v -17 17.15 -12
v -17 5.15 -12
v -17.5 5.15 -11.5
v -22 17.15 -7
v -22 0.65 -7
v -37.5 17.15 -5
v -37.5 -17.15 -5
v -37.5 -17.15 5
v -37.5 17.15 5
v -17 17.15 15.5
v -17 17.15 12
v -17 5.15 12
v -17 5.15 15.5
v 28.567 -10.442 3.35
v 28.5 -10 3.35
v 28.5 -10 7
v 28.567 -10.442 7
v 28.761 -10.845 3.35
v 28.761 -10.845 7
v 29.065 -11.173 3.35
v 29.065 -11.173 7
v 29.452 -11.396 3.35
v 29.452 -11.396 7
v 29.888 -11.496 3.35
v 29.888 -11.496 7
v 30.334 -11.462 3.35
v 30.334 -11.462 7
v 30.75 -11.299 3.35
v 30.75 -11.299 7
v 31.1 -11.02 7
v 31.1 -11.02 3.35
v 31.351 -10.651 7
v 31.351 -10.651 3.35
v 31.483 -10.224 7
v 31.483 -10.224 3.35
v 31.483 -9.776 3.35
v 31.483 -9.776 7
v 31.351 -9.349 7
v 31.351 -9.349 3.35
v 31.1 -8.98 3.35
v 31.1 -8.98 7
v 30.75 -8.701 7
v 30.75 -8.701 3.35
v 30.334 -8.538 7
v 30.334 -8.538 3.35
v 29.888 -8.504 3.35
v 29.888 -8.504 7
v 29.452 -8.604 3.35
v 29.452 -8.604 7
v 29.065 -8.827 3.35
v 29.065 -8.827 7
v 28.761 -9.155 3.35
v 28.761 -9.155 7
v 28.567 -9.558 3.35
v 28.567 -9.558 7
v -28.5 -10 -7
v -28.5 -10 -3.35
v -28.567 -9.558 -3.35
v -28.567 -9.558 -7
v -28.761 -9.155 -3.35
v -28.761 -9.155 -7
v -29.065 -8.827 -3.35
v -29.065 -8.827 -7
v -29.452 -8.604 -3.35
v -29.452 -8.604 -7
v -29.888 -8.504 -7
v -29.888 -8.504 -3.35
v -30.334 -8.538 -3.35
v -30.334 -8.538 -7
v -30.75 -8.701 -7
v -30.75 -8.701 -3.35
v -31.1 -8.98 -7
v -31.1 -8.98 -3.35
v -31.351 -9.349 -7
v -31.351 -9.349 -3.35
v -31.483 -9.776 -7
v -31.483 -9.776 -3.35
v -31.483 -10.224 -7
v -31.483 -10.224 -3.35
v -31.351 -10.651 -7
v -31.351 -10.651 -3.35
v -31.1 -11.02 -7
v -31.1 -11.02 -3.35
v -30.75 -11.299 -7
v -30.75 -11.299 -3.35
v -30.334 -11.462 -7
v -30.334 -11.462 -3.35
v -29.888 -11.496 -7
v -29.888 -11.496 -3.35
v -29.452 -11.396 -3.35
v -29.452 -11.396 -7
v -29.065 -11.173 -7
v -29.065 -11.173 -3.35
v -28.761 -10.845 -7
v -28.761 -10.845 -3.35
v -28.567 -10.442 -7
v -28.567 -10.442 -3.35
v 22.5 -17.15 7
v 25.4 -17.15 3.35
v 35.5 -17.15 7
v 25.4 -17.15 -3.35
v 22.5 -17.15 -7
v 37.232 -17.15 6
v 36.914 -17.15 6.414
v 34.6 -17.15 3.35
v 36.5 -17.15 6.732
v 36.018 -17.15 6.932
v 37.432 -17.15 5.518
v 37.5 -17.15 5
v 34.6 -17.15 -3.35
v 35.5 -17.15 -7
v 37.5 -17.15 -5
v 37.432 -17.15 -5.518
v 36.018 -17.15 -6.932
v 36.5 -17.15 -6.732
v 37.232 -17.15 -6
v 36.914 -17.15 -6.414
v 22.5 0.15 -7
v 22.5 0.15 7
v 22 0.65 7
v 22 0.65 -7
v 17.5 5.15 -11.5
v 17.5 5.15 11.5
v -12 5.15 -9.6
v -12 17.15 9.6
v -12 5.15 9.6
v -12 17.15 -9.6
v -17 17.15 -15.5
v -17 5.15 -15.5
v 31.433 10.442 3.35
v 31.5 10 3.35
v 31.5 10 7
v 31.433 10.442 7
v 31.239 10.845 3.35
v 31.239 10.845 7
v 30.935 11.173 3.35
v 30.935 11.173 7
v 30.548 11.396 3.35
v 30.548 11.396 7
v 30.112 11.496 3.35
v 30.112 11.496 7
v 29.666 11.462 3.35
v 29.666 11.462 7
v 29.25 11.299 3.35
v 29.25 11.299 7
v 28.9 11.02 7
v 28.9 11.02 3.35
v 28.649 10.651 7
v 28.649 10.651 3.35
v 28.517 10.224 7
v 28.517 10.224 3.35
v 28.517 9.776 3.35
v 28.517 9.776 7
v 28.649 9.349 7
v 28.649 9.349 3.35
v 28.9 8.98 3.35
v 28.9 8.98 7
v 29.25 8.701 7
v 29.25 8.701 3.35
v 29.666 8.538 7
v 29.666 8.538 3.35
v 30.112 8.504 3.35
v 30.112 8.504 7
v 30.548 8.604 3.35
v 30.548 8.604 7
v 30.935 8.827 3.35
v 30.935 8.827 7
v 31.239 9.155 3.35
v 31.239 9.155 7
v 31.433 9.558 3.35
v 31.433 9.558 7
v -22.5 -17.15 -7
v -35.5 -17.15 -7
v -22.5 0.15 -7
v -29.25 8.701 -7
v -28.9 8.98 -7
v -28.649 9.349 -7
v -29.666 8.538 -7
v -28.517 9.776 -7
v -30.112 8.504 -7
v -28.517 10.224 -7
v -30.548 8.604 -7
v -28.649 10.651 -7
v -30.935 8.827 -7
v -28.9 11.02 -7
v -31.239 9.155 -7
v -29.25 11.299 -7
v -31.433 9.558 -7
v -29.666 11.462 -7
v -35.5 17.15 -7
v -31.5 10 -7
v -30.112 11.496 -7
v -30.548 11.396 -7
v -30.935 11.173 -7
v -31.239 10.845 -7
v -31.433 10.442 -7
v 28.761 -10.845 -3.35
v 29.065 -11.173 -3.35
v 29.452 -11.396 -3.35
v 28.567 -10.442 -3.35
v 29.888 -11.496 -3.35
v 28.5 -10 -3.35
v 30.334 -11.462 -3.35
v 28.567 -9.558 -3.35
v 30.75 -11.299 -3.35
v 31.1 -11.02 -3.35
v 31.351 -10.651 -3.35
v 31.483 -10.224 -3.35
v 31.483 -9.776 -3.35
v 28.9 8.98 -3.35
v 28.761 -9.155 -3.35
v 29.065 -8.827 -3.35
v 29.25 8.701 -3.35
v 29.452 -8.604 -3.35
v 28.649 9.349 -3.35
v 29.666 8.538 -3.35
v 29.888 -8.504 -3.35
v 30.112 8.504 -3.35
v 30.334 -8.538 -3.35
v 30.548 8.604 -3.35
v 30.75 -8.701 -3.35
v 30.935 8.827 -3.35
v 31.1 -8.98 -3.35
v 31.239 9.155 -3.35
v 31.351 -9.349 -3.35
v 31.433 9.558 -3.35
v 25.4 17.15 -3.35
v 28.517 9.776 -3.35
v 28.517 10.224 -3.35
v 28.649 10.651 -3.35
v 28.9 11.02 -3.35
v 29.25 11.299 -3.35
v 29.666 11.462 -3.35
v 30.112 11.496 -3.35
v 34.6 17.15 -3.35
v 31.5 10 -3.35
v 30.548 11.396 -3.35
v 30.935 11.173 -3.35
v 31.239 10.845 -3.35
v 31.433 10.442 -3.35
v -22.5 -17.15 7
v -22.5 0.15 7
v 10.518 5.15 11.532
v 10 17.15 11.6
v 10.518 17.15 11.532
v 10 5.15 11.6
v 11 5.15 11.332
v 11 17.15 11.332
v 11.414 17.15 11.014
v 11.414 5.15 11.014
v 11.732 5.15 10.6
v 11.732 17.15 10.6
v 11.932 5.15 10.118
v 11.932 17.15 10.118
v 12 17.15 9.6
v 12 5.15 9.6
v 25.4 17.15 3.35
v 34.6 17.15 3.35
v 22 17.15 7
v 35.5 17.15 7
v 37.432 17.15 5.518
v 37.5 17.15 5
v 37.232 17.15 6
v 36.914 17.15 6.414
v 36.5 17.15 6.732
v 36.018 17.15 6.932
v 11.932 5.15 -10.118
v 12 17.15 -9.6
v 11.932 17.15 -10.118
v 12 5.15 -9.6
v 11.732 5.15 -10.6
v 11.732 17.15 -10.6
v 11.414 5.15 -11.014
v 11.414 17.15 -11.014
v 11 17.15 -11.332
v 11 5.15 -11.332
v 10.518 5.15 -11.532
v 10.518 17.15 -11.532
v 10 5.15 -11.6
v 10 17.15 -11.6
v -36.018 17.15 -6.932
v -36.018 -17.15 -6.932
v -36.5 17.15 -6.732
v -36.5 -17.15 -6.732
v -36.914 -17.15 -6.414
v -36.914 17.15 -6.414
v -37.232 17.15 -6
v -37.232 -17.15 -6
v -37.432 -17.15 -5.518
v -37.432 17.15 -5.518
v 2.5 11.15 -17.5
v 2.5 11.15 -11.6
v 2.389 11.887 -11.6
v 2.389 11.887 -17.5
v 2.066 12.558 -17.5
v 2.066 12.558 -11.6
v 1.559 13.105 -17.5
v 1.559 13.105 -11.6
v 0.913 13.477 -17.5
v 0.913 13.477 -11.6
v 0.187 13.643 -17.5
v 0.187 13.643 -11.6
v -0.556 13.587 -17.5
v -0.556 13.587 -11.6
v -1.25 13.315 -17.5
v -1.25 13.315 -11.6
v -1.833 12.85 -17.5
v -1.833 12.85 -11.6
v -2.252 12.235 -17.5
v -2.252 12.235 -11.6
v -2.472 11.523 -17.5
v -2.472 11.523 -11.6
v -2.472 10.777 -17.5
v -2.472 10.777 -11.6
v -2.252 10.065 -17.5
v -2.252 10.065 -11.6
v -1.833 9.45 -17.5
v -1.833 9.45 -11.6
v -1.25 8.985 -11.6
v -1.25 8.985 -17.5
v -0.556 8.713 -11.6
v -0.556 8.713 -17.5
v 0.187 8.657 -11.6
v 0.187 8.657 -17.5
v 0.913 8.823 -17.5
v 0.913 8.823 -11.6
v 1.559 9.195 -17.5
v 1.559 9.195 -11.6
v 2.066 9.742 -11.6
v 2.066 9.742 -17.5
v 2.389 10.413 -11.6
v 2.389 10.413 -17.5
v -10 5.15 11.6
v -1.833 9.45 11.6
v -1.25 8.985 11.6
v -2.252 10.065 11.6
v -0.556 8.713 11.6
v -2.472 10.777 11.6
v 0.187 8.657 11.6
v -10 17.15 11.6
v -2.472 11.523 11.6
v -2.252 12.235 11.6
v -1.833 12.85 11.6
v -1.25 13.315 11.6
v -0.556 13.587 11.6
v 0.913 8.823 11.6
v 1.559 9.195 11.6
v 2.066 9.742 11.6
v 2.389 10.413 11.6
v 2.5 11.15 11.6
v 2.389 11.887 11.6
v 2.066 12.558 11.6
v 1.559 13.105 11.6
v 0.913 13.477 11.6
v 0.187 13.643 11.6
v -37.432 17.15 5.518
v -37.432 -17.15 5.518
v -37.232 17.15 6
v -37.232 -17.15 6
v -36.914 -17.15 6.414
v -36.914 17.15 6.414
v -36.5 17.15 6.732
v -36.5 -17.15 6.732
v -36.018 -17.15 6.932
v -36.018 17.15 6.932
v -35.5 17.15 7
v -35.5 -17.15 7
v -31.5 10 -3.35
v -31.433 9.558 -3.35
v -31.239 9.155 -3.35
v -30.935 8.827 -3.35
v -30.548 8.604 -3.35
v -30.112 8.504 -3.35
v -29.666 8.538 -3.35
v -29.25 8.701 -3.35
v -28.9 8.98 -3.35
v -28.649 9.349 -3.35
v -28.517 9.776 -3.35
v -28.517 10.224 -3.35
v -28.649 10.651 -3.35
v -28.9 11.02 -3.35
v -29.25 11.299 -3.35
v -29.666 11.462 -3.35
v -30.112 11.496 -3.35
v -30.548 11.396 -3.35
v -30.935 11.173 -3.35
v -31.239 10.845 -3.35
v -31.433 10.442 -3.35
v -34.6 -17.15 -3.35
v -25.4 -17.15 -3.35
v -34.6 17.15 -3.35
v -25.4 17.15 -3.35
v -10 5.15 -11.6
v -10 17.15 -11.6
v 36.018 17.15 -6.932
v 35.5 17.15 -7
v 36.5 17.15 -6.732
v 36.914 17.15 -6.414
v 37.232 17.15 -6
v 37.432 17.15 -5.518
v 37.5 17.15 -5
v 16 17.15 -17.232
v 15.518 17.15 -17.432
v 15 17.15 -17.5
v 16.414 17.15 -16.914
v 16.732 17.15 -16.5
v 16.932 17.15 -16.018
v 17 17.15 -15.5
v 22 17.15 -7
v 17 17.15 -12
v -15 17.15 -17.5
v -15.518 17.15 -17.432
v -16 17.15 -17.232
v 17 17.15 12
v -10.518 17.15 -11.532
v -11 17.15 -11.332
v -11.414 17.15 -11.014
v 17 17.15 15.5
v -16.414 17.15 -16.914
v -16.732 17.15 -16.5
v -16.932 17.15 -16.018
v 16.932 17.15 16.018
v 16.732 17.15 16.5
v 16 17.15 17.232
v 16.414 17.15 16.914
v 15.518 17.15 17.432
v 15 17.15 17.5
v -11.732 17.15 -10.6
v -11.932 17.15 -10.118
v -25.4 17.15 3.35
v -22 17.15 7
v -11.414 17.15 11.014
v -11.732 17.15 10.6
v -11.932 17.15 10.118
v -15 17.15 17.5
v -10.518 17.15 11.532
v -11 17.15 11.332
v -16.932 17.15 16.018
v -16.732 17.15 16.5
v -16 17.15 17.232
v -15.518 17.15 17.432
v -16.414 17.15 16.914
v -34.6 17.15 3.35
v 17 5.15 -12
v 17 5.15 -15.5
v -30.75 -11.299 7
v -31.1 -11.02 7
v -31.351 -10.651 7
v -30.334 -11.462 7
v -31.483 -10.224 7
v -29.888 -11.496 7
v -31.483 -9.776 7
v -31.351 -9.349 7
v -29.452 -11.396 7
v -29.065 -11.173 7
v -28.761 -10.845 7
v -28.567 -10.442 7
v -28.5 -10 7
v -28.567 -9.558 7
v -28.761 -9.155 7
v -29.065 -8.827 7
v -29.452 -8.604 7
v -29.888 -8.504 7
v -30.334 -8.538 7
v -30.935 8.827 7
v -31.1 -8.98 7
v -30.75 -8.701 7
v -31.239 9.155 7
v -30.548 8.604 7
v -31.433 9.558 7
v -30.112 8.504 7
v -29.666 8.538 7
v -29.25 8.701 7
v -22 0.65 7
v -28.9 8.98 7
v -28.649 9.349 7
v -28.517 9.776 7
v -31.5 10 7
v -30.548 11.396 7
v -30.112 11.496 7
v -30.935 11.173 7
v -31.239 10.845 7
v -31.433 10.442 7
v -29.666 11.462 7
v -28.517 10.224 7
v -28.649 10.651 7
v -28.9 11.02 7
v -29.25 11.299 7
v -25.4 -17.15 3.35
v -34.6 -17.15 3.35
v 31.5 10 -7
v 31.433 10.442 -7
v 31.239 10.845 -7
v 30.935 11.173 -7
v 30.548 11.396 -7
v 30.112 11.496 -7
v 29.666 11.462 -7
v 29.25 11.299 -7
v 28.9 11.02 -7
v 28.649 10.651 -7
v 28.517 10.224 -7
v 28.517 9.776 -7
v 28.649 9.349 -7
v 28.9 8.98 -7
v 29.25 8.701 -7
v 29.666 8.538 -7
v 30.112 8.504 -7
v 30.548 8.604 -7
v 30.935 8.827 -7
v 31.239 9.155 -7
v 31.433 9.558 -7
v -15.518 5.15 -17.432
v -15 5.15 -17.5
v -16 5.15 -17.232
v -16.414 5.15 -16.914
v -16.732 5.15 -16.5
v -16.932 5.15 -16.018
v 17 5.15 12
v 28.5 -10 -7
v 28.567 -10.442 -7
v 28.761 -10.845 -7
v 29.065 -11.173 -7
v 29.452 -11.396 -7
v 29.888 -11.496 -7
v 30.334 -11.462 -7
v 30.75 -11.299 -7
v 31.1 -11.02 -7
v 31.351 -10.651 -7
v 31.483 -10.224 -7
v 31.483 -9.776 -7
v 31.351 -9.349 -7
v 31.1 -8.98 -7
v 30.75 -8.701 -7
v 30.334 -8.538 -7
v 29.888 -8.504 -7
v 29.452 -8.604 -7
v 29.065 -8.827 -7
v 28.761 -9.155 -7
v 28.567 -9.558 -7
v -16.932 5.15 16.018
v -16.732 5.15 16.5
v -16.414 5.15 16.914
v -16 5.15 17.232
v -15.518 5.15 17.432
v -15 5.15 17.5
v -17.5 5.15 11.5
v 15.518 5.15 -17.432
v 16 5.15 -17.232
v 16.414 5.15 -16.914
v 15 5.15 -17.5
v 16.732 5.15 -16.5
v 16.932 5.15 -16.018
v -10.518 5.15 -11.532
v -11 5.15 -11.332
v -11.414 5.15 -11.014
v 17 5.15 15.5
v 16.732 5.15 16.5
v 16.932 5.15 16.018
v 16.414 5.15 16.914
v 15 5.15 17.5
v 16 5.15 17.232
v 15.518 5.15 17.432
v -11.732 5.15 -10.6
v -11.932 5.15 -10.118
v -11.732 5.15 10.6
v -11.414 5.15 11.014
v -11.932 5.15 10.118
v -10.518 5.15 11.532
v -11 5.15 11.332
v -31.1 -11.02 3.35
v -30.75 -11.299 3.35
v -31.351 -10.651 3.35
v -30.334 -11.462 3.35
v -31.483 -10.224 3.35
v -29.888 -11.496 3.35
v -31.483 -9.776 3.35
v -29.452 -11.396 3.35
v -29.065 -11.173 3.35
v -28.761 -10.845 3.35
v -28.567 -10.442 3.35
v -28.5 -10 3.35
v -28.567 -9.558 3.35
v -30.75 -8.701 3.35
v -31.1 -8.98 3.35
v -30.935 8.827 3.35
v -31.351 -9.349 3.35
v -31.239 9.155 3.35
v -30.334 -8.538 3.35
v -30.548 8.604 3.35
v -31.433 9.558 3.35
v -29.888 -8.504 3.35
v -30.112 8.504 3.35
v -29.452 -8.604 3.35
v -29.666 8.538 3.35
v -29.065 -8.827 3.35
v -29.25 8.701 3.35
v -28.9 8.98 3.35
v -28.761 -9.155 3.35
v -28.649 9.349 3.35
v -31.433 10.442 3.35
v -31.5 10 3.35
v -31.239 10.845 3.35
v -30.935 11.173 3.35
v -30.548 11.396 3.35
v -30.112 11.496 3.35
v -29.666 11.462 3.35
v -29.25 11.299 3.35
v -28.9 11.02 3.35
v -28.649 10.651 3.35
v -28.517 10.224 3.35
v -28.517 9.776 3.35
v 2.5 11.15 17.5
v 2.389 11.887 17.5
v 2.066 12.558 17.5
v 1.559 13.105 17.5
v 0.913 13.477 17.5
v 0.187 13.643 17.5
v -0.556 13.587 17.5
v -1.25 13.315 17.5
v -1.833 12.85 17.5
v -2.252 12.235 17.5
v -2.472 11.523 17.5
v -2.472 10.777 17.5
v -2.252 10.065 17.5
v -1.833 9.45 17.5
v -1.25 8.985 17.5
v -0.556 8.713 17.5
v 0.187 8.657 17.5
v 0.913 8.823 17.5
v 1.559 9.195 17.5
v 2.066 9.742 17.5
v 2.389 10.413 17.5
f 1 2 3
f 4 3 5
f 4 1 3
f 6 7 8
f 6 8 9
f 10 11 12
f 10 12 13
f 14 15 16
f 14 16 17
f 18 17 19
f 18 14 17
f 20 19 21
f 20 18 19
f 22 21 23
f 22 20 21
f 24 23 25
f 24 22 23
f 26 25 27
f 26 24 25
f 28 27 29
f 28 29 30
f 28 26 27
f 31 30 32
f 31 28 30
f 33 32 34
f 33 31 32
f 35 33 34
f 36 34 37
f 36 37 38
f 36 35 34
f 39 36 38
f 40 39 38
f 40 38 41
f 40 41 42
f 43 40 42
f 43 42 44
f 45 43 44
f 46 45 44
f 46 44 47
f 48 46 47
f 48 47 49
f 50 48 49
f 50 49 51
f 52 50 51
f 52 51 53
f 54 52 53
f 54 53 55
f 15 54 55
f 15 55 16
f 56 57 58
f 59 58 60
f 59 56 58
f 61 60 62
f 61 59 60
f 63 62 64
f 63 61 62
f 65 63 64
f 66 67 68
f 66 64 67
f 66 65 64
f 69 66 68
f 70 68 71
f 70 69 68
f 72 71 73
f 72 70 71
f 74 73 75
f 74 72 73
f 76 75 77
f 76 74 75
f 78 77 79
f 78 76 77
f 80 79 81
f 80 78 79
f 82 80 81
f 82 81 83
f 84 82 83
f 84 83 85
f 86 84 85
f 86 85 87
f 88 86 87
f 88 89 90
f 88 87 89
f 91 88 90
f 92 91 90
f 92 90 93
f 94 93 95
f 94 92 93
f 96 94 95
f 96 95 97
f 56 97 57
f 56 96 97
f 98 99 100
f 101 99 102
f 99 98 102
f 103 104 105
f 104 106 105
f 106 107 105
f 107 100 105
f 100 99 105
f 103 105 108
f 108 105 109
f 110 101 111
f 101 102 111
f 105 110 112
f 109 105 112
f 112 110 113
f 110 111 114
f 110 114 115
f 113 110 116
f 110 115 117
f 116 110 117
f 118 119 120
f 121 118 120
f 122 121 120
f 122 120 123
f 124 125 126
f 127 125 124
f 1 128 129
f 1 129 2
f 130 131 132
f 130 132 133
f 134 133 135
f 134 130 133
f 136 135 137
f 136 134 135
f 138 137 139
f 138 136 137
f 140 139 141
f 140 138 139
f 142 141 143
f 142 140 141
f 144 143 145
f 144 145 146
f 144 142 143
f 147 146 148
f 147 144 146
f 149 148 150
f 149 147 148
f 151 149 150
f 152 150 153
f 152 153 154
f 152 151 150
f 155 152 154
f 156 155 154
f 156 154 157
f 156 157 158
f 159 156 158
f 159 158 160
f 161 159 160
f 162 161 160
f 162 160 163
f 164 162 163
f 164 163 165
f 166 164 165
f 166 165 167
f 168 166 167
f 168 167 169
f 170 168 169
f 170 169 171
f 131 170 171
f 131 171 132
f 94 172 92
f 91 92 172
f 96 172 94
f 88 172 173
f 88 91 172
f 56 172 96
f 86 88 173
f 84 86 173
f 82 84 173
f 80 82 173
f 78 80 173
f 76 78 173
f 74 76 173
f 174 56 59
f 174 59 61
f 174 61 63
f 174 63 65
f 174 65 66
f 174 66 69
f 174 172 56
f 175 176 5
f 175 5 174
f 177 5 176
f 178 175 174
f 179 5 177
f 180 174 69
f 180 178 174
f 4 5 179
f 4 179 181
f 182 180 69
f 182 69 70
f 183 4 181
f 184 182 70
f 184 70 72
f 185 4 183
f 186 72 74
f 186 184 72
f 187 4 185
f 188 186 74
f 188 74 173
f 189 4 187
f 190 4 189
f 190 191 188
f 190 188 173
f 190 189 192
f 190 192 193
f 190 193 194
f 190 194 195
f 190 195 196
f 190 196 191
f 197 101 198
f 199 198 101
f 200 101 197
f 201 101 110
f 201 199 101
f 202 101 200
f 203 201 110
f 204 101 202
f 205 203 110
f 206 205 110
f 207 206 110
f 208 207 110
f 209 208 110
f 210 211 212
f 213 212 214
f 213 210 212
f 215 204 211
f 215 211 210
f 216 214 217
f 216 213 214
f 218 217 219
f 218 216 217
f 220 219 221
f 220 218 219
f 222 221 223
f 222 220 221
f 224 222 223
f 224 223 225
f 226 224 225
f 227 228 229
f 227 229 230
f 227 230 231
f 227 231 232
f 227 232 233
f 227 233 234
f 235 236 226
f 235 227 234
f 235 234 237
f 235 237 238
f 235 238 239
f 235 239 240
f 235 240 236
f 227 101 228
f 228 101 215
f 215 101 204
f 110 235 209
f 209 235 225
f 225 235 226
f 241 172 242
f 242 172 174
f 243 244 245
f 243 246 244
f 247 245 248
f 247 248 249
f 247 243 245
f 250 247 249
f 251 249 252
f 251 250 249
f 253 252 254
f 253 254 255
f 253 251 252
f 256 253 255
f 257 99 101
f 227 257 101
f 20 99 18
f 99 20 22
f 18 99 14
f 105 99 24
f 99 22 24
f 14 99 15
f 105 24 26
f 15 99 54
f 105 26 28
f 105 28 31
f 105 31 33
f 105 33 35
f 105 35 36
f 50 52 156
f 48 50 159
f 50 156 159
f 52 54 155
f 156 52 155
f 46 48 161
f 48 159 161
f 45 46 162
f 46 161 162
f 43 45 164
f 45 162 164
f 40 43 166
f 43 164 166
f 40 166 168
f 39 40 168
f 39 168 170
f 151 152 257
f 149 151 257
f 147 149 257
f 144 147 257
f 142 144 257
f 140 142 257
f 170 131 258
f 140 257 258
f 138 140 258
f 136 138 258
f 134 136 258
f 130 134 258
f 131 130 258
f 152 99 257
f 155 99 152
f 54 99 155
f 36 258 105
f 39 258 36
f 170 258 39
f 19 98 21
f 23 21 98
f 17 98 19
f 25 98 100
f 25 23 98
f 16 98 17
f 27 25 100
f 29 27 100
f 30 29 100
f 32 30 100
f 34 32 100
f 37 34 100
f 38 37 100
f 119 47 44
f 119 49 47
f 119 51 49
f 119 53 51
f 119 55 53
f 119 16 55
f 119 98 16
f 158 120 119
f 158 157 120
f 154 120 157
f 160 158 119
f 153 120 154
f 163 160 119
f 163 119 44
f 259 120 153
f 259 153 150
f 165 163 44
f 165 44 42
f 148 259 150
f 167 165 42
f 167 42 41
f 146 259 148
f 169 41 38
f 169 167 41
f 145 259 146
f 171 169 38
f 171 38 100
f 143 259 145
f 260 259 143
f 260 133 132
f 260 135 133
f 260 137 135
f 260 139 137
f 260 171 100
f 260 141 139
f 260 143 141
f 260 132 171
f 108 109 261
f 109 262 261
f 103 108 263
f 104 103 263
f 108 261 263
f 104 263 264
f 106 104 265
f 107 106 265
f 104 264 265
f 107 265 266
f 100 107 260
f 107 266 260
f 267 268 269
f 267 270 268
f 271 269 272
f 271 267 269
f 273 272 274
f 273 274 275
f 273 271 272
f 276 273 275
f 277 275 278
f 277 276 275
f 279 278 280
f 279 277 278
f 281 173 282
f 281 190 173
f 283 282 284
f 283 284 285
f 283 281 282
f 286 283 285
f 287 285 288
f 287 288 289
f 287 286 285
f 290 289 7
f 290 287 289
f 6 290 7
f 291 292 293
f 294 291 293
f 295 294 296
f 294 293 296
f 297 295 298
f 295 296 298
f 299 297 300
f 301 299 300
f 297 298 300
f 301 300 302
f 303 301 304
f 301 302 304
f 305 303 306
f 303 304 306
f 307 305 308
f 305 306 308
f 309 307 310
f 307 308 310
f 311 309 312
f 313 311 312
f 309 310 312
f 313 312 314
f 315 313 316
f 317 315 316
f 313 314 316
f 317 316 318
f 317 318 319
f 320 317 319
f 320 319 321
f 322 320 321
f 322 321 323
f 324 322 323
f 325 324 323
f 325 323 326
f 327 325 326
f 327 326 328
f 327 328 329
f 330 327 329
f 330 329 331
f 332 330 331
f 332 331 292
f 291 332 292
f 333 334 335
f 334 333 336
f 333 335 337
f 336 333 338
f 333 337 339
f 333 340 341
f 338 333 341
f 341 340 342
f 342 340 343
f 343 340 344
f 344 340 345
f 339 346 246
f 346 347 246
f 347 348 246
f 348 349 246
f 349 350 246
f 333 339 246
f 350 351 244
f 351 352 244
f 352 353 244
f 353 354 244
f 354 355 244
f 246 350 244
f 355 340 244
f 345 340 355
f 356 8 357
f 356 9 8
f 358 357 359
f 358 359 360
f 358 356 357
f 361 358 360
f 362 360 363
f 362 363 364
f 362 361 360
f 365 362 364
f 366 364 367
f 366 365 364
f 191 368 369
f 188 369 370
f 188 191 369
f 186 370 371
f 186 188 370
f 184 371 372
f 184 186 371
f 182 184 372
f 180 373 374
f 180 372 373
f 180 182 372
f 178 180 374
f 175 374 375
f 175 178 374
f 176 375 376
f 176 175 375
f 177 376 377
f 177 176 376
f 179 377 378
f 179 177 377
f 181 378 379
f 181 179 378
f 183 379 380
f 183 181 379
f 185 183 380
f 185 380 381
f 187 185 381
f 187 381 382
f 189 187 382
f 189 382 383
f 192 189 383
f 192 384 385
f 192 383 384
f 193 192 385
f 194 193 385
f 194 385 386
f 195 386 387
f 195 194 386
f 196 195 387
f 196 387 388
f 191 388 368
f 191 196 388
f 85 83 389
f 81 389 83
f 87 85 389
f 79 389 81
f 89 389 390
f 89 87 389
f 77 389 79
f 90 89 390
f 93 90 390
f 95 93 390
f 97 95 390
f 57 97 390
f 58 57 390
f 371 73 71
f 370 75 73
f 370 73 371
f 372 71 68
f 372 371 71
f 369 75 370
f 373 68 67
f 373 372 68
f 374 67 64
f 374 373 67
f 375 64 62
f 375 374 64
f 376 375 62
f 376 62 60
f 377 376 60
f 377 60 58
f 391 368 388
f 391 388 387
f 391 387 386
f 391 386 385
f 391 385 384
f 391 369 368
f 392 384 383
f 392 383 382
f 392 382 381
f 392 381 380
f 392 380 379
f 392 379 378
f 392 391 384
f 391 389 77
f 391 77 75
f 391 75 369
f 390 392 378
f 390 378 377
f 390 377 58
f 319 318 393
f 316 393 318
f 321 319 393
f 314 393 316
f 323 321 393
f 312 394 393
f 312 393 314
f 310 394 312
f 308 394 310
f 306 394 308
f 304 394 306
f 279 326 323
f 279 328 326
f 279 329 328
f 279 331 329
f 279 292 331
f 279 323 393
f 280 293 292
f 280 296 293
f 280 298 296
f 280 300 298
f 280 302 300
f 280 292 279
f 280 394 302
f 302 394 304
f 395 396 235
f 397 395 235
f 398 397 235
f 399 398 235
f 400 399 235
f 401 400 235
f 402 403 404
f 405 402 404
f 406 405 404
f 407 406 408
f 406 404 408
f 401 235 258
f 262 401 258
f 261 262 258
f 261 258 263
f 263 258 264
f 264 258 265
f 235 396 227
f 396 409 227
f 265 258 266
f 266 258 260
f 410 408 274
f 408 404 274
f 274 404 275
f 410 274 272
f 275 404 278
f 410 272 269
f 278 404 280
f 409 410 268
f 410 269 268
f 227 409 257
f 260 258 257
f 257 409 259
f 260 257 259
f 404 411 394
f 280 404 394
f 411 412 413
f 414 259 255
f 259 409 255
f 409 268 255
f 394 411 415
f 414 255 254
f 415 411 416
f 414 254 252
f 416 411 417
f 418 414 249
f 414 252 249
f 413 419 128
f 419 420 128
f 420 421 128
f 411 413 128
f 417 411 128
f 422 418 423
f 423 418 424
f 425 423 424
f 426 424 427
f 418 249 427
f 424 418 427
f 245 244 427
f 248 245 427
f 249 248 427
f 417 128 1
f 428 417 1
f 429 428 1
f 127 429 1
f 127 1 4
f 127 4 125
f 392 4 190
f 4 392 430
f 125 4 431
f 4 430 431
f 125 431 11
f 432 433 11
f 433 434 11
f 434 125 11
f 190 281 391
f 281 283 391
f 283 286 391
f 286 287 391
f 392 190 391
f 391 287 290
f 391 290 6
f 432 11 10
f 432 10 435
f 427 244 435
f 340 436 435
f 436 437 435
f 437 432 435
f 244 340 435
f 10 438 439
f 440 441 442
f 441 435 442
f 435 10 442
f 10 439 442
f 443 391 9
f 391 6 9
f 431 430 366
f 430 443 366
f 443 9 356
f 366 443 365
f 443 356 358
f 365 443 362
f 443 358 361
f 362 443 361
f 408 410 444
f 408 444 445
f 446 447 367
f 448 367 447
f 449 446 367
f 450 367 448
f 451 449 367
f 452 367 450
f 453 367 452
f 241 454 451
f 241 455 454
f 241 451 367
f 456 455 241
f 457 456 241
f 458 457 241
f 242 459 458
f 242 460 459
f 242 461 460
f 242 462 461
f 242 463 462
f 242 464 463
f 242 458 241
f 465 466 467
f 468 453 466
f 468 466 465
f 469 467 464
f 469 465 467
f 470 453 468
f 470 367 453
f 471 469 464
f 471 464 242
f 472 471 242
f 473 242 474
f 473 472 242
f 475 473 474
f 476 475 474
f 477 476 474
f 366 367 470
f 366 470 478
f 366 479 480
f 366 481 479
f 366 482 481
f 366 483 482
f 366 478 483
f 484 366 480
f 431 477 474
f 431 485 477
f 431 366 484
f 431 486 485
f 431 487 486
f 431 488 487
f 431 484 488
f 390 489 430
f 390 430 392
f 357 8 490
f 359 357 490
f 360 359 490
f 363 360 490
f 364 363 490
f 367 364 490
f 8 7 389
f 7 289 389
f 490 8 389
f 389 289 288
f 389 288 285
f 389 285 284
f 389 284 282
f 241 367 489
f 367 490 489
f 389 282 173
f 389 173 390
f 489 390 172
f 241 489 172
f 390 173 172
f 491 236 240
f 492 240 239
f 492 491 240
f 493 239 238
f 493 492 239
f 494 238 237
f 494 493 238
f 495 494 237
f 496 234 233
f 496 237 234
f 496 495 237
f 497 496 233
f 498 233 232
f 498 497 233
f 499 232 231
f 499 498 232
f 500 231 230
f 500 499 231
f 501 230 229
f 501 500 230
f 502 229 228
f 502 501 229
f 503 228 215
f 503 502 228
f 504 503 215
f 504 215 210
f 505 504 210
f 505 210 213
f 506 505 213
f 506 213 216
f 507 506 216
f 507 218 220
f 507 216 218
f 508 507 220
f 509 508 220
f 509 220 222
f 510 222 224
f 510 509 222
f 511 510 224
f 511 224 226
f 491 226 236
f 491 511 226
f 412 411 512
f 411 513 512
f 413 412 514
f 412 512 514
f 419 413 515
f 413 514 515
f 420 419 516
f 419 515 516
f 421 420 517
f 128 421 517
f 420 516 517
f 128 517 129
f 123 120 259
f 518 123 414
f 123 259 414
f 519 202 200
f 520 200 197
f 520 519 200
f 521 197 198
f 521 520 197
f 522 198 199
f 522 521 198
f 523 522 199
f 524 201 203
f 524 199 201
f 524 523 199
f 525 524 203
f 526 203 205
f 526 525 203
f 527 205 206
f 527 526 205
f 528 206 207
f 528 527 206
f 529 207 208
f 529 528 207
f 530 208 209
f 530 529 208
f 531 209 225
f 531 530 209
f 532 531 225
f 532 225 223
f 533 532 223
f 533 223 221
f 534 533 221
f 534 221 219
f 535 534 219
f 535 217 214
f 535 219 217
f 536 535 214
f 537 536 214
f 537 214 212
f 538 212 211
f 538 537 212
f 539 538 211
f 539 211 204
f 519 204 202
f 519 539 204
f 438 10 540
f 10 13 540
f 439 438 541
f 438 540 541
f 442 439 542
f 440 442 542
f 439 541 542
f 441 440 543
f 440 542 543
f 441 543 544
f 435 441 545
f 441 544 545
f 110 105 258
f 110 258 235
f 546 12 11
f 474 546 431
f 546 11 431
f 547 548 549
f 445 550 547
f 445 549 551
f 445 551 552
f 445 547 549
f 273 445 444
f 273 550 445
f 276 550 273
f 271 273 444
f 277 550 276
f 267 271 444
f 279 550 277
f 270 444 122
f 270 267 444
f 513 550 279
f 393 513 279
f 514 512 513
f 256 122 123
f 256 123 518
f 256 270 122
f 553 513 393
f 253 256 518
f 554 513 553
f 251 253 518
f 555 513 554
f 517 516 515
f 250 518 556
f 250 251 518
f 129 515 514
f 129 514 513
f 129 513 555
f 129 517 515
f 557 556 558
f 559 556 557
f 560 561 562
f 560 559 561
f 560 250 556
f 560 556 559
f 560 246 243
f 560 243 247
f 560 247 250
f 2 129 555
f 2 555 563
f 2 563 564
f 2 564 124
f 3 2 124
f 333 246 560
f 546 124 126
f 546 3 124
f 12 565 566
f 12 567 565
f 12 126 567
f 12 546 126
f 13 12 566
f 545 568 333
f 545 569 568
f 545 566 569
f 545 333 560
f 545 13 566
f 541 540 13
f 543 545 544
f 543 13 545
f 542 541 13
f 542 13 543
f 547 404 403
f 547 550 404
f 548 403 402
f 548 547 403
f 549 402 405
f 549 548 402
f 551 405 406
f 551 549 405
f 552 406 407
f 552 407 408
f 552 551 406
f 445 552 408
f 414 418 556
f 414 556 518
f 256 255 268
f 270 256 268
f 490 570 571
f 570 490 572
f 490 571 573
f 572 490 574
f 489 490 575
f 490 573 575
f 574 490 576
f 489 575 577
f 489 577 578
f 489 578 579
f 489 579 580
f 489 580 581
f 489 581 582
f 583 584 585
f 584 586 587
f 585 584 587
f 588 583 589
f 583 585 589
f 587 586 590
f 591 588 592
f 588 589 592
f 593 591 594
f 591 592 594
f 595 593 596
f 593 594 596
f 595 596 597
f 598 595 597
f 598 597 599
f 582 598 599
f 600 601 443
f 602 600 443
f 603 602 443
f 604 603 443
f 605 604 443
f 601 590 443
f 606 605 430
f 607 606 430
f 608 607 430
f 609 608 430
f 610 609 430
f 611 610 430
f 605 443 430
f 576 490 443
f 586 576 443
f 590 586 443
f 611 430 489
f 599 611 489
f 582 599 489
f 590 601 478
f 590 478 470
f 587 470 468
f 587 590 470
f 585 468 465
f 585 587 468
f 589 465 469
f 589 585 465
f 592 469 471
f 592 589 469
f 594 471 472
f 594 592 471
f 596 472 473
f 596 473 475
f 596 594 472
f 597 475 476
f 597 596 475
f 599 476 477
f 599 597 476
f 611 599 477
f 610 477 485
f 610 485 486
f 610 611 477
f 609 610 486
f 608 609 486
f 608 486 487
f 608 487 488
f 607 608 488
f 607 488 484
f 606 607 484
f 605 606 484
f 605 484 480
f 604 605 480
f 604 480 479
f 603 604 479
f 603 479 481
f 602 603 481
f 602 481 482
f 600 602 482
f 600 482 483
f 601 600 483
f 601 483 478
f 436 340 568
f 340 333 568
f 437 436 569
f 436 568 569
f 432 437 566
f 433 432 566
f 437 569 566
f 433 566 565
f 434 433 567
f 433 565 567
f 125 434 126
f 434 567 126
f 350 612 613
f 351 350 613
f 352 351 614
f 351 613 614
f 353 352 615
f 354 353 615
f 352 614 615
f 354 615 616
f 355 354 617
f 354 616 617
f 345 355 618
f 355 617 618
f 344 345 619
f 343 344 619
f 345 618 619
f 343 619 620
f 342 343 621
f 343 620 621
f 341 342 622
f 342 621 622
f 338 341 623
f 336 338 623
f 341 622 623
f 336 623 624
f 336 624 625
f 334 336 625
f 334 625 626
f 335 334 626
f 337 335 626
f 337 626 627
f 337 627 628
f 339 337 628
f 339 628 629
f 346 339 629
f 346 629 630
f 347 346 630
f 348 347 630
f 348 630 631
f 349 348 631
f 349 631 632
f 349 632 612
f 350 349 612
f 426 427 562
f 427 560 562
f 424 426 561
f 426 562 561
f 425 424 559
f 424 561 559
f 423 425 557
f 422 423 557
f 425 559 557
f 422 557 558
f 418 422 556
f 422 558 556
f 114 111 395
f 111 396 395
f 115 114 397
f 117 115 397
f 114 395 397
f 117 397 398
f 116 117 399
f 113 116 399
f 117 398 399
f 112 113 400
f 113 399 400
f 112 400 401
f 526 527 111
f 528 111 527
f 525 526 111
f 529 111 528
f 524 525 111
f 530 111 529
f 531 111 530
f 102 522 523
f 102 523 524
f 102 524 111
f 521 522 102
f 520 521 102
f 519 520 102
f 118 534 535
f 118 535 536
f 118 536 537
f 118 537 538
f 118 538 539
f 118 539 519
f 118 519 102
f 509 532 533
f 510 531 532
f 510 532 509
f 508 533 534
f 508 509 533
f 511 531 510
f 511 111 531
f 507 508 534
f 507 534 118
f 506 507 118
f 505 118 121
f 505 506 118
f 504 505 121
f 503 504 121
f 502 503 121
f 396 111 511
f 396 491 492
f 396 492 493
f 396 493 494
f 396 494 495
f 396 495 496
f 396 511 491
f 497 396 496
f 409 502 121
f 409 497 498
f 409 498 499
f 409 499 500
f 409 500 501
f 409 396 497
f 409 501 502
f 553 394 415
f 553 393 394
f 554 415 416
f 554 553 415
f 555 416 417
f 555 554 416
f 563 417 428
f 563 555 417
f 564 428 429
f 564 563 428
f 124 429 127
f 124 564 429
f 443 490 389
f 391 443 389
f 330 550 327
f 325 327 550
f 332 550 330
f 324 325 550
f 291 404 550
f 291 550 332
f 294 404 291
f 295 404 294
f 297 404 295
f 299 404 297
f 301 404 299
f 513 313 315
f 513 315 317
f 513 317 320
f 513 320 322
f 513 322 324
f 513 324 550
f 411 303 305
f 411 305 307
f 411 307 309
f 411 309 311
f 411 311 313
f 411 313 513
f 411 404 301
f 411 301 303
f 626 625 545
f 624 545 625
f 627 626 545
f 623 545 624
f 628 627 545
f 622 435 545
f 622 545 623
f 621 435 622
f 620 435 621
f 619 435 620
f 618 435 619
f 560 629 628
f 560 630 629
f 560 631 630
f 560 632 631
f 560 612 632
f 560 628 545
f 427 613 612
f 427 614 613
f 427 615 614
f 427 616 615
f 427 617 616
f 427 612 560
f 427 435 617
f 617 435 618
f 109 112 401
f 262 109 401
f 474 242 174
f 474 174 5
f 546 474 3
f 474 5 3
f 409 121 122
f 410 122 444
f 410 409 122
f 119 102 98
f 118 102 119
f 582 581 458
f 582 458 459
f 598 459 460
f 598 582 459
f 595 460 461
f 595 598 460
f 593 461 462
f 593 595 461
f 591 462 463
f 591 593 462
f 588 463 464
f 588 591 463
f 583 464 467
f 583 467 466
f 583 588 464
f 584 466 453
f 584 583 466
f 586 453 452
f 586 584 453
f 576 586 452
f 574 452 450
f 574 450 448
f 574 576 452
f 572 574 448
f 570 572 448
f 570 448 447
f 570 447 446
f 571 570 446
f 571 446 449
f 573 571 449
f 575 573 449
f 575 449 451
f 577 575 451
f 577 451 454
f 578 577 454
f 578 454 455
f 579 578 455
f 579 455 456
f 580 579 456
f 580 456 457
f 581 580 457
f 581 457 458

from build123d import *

# Parameters (mm, degrees)
EXTRUDE_1_DEPTH        = 7
EXTRUDE_1_DEPTH_BACK   = 7
SKETCH_1_W             = 15
SKETCH_1_H             = 34.3
SKETCH_1_R             = 1.5
EXTRUDE_1_2_DEPTH      = 7
EXTRUDE_1_2_DEPTH_BACK = 7
SKETCH_2_W             = 9.2
SKETCH_2_H             = 6.7
CUT_EXTRUDE_1_DEPTH    = 62
SKETCH_3_W             = 24
SKETCH_3_H             = 23.2
EXTRUDE_2_DEPTH        = 12
SKETCH_4_R             = 2.5
CUT_EXTRUDE_2_DEPTH    = 90
FILLET_1_R             = 2
CHAMFER_1_SIZE         = 5
CHAMFER_2_SIZE         = 5
FILLET_2_R             = 2


with BuildPart() as part:
    # 草图1 → 凸台-拉伸1 (new, two sides: drawn at the far end of the back side and taken through both)
    with BuildSketch(Plane.XY.offset(-EXTRUDE_1_DEPTH_BACK)):
        with Locations((30, 0)):
            Rectangle(SKETCH_1_W, SKETCH_1_H)
        with Locations((30, 10)):
            Circle(SKETCH_1_R, mode=Mode.SUBTRACT)
        with Locations(Location((30, -10, 0), (0, 0, 180))):
            Circle(SKETCH_1_R, mode=Mode.SUBTRACT)
    extrude(amount=EXTRUDE_1_DEPTH + EXTRUDE_1_DEPTH_BACK)


with BuildPart() as body_2:
    # 草图1 → Extrude 1 2 (new, two sides: drawn at the far end of the back side and taken through both)
    with BuildSketch(Plane.XY.offset(-EXTRUDE_1_2_DEPTH_BACK)):
        with Locations((-30, 0)):
            Rectangle(SKETCH_1_W, SKETCH_1_H)
        with Locations((-30, -10)):
            Circle(SKETCH_1_R, mode=Mode.SUBTRACT)
        with Locations(Location((-30, 10, 0), (0, 0, 180))):
            Circle(SKETCH_1_R, mode=Mode.SUBTRACT)
    extrude(amount=EXTRUDE_1_2_DEPTH + EXTRUDE_1_2_DEPTH_BACK)


with BuildPart() as cut_extrude_1_tool:
    # 草图2 → 切除-拉伸1 (new body)
    with BuildSketch(Plane(origin=(0, 17.15, 0), x_dir=(1, 0, 0), z_dir=(0, 1, 0))):
        with Locations((30, 0)):
            Rectangle(SKETCH_2_W, SKETCH_2_H)
        with Locations((-30, 0)):
            Rectangle(SKETCH_2_W, SKETCH_2_H)
    extrude(amount=-CUT_EXTRUDE_1_DEPTH)


with BuildPart() as part_1:
    add(part.part)

    # 切除-拉伸1: cut by cut_extrude_1_tool
    add(cut_extrude_1_tool.part, mode=Mode.SUBTRACT)



with BuildPart() as body_2_1:
    add(body_2.part)

    # 切除-拉伸1: cut by cut_extrude_1_tool
    add(cut_extrude_1_tool.part, mode=Mode.SUBTRACT)


with BuildPart() as part_2:
    add(part_1.part)

    add(body_2_1.part)  # 凸台-拉伸2 merges body 2
    # 草图3 → 凸台-拉伸2 (add)
    with BuildSketch(Plane(origin=(0, 17.15, 0), x_dir=(1, 0, 0), z_dir=(0, 1, 0))):
        Polygon((22.5, 7), (17, 7), (17, 17.5), (-17, 17.5), (-17, 7), (-22.5, 7), (-22.5, -7), (-17, -7), (-17, -17.5), (17, -17.5), (17, -7), (22.5, -7), align=None)
        Rectangle(SKETCH_3_W, SKETCH_3_H, mode=Mode.SUBTRACT)
    extrude(amount=-EXTRUDE_2_DEPTH)

    # 草图4 → 切除-拉伸2 (cut)
    with BuildSketch(Plane.XY.offset(17.5)):
        with Locations((0, 11.15)):
            Circle(SKETCH_4_R)
    extrude(amount=-CUT_EXTRUDE_2_DEPTH, mode=Mode.SUBTRACT)

    # 圆角1
    fillet_1_edges = [part_2.edges().sort_by_distance(p)[0] for p in [
        (-37.5, 0, -7),
        (-37.5, 0, 7),
        (37.5, 0, 7),
        (37.5, 0, -7),
    ]]
    fillet(fillet_1_edges, radius=FILLET_1_R)

    # 倒角1
    chamfer_1_edges = [part_2.edges().sort_by_distance(p)[0] for p in [
        (22.5, 5.15, 0),
        (-22.5, 5.15, 0),
    ]]
    chamfer(chamfer_1_edges, length=CHAMFER_1_SIZE)

    # 倒角2
    # the kernel refuses this chamfer: 5 mm, written as the material it adds along each edge
    with BuildSketch(Plane(origin=(17, 17.15, -7), x_dir=(0.9996219169112968, 0, 0.027495876610586147), z_dir=(0, -1, 0))) as chamfer_2_piece_1_section:
        Polygon((CHAMFER_2_SIZE * 0.999621916911, -CHAMFER_2_SIZE * 0.0274958766106), (-CHAMFER_2_SIZE * 0.0274958766106, -CHAMFER_2_SIZE * 0.999621916911), (0, 0), align=None)
    chamfer_2_piece_1 = extrude(amount=12, mode=Mode.PRIVATE)
    chamfer_2_piece_1 = split(chamfer_2_piece_1, bisect_by=Plane(origin=(15.061953737, 7.588046263, -8.643148294), z_dir=(0.7071067811865476, 0.7071067811865475, 0)), keep=Keep.TOP, mode=Mode.PRIVATE)
    add(chamfer_2_piece_1)
    with BuildSketch(Plane(origin=(17, 17.15, -7), x_dir=(0.9996219169112968, 0, 0.027495876610586147), z_dir=(0, -1, 0))) as chamfer_2_piece_2_section:
        Polygon((CHAMFER_2_SIZE * 0.999621916911, -CHAMFER_2_SIZE * 0.0274958766106), (-CHAMFER_2_SIZE * 0.0274958766106, -CHAMFER_2_SIZE * 0.999621916911), (0, 0), align=None)
    chamfer_2_piece_2 = extrude(amount=12, mode=Mode.PRIVATE)
    chamfer_2_piece_2 = split(chamfer_2_piece_2, bisect_by=Plane(origin=(17.181894142, 5.468105858, -9.627776216), z_dir=(-0.7071067811865476, -0.7071067811865475, 0)), keep=Keep.TOP, mode=Mode.PRIVATE)
    add(chamfer_2_piece_2)
    with BuildSketch(Plane(origin=(17, 17.15, -7), x_dir=(0.9996219169112968, 0, 0.027495876610586147), z_dir=(0, -1, 0))) as chamfer_2_piece_3_section:
        Polygon((CHAMFER_2_SIZE * 0.999621916911, -CHAMFER_2_SIZE * 0.0274958766106), (-CHAMFER_2_SIZE * 0.0274958766106, -CHAMFER_2_SIZE * 0.999621916911), (0, 0), align=None)
    chamfer_2_piece_3 = extrude(amount=24.85841494, mode=Mode.PRIVATE)
    chamfer_2_piece_3 = split(chamfer_2_piece_3, bisect_by=Plane(origin=(19.269171179, 3.380828821, -8.010149173), z_dir=(0.7071067811865476, 0.7071067811865475, 0)), keep=Keep.TOP, mode=Mode.PRIVATE)
    chamfer_2_piece_3 = split(chamfer_2_piece_3, bisect_by=Plane(origin=(19.858894906, 5.15, -8.010149173), z_dir=(0, -1, 0)), keep=Keep.TOP, mode=Mode.PRIVATE)
    add(chamfer_2_piece_3)
    with BuildSketch(Plane(origin=(-17, 17.15, -7), x_dir=(0.027495876610586313, 0, -0.9996219169112968), z_dir=(0, -1, 0))) as chamfer_2_piece_4_section:
        Polygon((CHAMFER_2_SIZE * 0.999621916911, -CHAMFER_2_SIZE * 0.0274958766106), (-CHAMFER_2_SIZE * 0.0274958766106, -CHAMFER_2_SIZE * 0.999621916911), (0, 0), align=None)
    chamfer_2_piece_4 = extrude(amount=12, mode=Mode.PRIVATE)
    chamfer_2_piece_4 = split(chamfer_2_piece_4, bisect_by=Plane(origin=(-15.061953737, 7.588046263, -8.643148294), z_dir=(-0.7071067811865475, 0.7071067811865476, 0)), keep=Keep.TOP, mode=Mode.PRIVATE)
    add(chamfer_2_piece_4)
    with BuildSketch(Plane(origin=(-17, 17.15, -7), x_dir=(0.027495876610586313, 0, -0.9996219169112968), z_dir=(0, -1, 0))) as chamfer_2_piece_5_section:
        Polygon((CHAMFER_2_SIZE * 0.999621916911, -CHAMFER_2_SIZE * 0.0274958766106), (-CHAMFER_2_SIZE * 0.0274958766106, -CHAMFER_2_SIZE * 0.999621916911), (0, 0), align=None)
    chamfer_2_piece_5 = extrude(amount=24.85841494, mode=Mode.PRIVATE)
    chamfer_2_piece_5 = split(chamfer_2_piece_5, bisect_by=Plane(origin=(-19.858894906, 5.15, -8.010149173), z_dir=(0, -1, 0)), keep=Keep.TOP, mode=Mode.PRIVATE)
    chamfer_2_piece_5 = split(chamfer_2_piece_5, bisect_by=Plane(origin=(-19.269171179, 3.380828821, -8.010149173), z_dir=(-0.7071067811865475, 0.7071067811865476, 0)), keep=Keep.TOP, mode=Mode.PRIVATE)
    add(chamfer_2_piece_5)
    with BuildSketch(Plane(origin=(-17, 17.15, -7), x_dir=(0.027495876610586313, 0, -0.9996219169112968), z_dir=(0, -1, 0))) as chamfer_2_piece_6_section:
        Polygon((CHAMFER_2_SIZE * 0.999621916911, -CHAMFER_2_SIZE * 0.0274958766106), (-CHAMFER_2_SIZE * 0.0274958766106, -CHAMFER_2_SIZE * 0.999621916911), (0, 0), align=None)
    chamfer_2_piece_6 = extrude(amount=12, mode=Mode.PRIVATE)
    chamfer_2_piece_6 = split(chamfer_2_piece_6, bisect_by=Plane(origin=(-17.181894142, 5.468105858, -9.627776216), z_dir=(0.7071067811865475, -0.7071067811865476, 0)), keep=Keep.TOP, mode=Mode.PRIVATE)
    add(chamfer_2_piece_6)
    with BuildSketch(Plane(origin=(17, 17.15, 7), x_dir=(0.9996219169112968, 0, -0.027495876610586147), z_dir=(0, -1, 0))) as chamfer_2_piece_7_section:
        Polygon((CHAMFER_2_SIZE * 0.999621916911, CHAMFER_2_SIZE * 0.0274958766106), (-CHAMFER_2_SIZE * 0.0274958766106, CHAMFER_2_SIZE * 0.999621916911), (0, 0), align=None)
    chamfer_2_piece_7 = extrude(amount=12, mode=Mode.PRIVATE)
    chamfer_2_piece_7 = split(chamfer_2_piece_7, bisect_by=Plane(origin=(15.061953737, 7.588046263, 8.643148294), z_dir=(0.7071067811865476, 0.7071067811865475, 0)), keep=Keep.TOP, mode=Mode.PRIVATE)
    add(chamfer_2_piece_7)
    with BuildSketch(Plane(origin=(17, 17.15, 7), x_dir=(0.9996219169112968, 0, -0.027495876610586147), z_dir=(0, -1, 0))) as chamfer_2_piece_8_section:
        Polygon((CHAMFER_2_SIZE * 0.999621916911, CHAMFER_2_SIZE * 0.0274958766106), (-CHAMFER_2_SIZE * 0.0274958766106, CHAMFER_2_SIZE * 0.999621916911), (0, 0), align=None)
    chamfer_2_piece_8 = extrude(amount=12, mode=Mode.PRIVATE)
    chamfer_2_piece_8 = split(chamfer_2_piece_8, bisect_by=Plane(origin=(17.181894142, 5.468105858, 9.627776216), z_dir=(-0.7071067811865476, -0.7071067811865475, 0)), keep=Keep.TOP, mode=Mode.PRIVATE)
    add(chamfer_2_piece_8)
    with BuildSketch(Plane(origin=(17, 17.15, 7), x_dir=(0.9996219169112968, 0, -0.027495876610586147), z_dir=(0, -1, 0))) as chamfer_2_piece_9_section:
        Polygon((CHAMFER_2_SIZE * 0.999621916911, CHAMFER_2_SIZE * 0.0274958766106), (-CHAMFER_2_SIZE * 0.0274958766106, CHAMFER_2_SIZE * 0.999621916911), (0, 0), align=None)
    chamfer_2_piece_9 = extrude(amount=24.85841494, mode=Mode.PRIVATE)
    chamfer_2_piece_9 = split(chamfer_2_piece_9, bisect_by=Plane(origin=(19.269171179, 3.380828821, 8.010149173), z_dir=(0.7071067811865476, 0.7071067811865475, 0)), keep=Keep.TOP, mode=Mode.PRIVATE)
    chamfer_2_piece_9 = split(chamfer_2_piece_9, bisect_by=Plane(origin=(19.858894906, 5.15, 8.010149173), z_dir=(0, -1, 0)), keep=Keep.TOP, mode=Mode.PRIVATE)
    add(chamfer_2_piece_9)
    with BuildSketch(Plane(origin=(-17, 17.15, 7), x_dir=(0.027495876610586313, 0, 0.9996219169112968), z_dir=(0, -1, 0))) as chamfer_2_piece_10_section:
        Polygon((CHAMFER_2_SIZE * 0.999621916911, CHAMFER_2_SIZE * 0.0274958766106), (-CHAMFER_2_SIZE * 0.0274958766106, CHAMFER_2_SIZE * 0.999621916911), (0, 0), align=None)
    chamfer_2_piece_10 = extrude(amount=12, mode=Mode.PRIVATE)
    chamfer_2_piece_10 = split(chamfer_2_piece_10, bisect_by=Plane(origin=(-15.061953737, 7.588046263, 8.643148294), z_dir=(-0.7071067811865475, 0.7071067811865476, 0)), keep=Keep.TOP, mode=Mode.PRIVATE)
    add(chamfer_2_piece_10)
    with BuildSketch(Plane(origin=(-17, 17.15, 7), x_dir=(0.027495876610586313, 0, 0.9996219169112968), z_dir=(0, -1, 0))) as chamfer_2_piece_11_section:
        Polygon((CHAMFER_2_SIZE * 0.999621916911, CHAMFER_2_SIZE * 0.0274958766106), (-CHAMFER_2_SIZE * 0.0274958766106, CHAMFER_2_SIZE * 0.999621916911), (0, 0), align=None)
    chamfer_2_piece_11 = extrude(amount=24.85841494, mode=Mode.PRIVATE)
    chamfer_2_piece_11 = split(chamfer_2_piece_11, bisect_by=Plane(origin=(-19.858894906, 5.15, 8.010149173), z_dir=(0, -1, 0)), keep=Keep.TOP, mode=Mode.PRIVATE)
    chamfer_2_piece_11 = split(chamfer_2_piece_11, bisect_by=Plane(origin=(-19.269171179, 3.380828821, 8.010149173), z_dir=(-0.7071067811865475, 0.7071067811865476, 0)), keep=Keep.TOP, mode=Mode.PRIVATE)
    add(chamfer_2_piece_11)
    with BuildSketch(Plane(origin=(-17, 17.15, 7), x_dir=(0.027495876610586313, 0, 0.9996219169112968), z_dir=(0, -1, 0))) as chamfer_2_piece_12_section:
        Polygon((CHAMFER_2_SIZE * 0.999621916911, CHAMFER_2_SIZE * 0.0274958766106), (-CHAMFER_2_SIZE * 0.0274958766106, CHAMFER_2_SIZE * 0.999621916911), (0, 0), align=None)
    chamfer_2_piece_12 = extrude(amount=12, mode=Mode.PRIVATE)
    chamfer_2_piece_12 = split(chamfer_2_piece_12, bisect_by=Plane(origin=(-17.181894142, 5.468105858, 9.627776216), z_dir=(0.7071067811865475, -0.7071067811865476, 0)), keep=Keep.TOP, mode=Mode.PRIVATE)
    add(chamfer_2_piece_12)

    # 圆角2
    fillet_2_edges = [part_2.edges().sort_by_distance(p)[0] for p in [
        (12, 11.15, -11.6),
        (17, 11.15, 17.5),
        (-17, 11.15, 17.5),
        (-17, 11.15, -17.5),
        (17, 11.15, -17.5),
        (12, 11.15, 11.6),
        (-12, 11.15, 11.6),
        (-12, 11.15, -11.6),
    ]]
    fillet(fillet_2_edges, radius=FILLET_2_R)


solid = part_2.part
